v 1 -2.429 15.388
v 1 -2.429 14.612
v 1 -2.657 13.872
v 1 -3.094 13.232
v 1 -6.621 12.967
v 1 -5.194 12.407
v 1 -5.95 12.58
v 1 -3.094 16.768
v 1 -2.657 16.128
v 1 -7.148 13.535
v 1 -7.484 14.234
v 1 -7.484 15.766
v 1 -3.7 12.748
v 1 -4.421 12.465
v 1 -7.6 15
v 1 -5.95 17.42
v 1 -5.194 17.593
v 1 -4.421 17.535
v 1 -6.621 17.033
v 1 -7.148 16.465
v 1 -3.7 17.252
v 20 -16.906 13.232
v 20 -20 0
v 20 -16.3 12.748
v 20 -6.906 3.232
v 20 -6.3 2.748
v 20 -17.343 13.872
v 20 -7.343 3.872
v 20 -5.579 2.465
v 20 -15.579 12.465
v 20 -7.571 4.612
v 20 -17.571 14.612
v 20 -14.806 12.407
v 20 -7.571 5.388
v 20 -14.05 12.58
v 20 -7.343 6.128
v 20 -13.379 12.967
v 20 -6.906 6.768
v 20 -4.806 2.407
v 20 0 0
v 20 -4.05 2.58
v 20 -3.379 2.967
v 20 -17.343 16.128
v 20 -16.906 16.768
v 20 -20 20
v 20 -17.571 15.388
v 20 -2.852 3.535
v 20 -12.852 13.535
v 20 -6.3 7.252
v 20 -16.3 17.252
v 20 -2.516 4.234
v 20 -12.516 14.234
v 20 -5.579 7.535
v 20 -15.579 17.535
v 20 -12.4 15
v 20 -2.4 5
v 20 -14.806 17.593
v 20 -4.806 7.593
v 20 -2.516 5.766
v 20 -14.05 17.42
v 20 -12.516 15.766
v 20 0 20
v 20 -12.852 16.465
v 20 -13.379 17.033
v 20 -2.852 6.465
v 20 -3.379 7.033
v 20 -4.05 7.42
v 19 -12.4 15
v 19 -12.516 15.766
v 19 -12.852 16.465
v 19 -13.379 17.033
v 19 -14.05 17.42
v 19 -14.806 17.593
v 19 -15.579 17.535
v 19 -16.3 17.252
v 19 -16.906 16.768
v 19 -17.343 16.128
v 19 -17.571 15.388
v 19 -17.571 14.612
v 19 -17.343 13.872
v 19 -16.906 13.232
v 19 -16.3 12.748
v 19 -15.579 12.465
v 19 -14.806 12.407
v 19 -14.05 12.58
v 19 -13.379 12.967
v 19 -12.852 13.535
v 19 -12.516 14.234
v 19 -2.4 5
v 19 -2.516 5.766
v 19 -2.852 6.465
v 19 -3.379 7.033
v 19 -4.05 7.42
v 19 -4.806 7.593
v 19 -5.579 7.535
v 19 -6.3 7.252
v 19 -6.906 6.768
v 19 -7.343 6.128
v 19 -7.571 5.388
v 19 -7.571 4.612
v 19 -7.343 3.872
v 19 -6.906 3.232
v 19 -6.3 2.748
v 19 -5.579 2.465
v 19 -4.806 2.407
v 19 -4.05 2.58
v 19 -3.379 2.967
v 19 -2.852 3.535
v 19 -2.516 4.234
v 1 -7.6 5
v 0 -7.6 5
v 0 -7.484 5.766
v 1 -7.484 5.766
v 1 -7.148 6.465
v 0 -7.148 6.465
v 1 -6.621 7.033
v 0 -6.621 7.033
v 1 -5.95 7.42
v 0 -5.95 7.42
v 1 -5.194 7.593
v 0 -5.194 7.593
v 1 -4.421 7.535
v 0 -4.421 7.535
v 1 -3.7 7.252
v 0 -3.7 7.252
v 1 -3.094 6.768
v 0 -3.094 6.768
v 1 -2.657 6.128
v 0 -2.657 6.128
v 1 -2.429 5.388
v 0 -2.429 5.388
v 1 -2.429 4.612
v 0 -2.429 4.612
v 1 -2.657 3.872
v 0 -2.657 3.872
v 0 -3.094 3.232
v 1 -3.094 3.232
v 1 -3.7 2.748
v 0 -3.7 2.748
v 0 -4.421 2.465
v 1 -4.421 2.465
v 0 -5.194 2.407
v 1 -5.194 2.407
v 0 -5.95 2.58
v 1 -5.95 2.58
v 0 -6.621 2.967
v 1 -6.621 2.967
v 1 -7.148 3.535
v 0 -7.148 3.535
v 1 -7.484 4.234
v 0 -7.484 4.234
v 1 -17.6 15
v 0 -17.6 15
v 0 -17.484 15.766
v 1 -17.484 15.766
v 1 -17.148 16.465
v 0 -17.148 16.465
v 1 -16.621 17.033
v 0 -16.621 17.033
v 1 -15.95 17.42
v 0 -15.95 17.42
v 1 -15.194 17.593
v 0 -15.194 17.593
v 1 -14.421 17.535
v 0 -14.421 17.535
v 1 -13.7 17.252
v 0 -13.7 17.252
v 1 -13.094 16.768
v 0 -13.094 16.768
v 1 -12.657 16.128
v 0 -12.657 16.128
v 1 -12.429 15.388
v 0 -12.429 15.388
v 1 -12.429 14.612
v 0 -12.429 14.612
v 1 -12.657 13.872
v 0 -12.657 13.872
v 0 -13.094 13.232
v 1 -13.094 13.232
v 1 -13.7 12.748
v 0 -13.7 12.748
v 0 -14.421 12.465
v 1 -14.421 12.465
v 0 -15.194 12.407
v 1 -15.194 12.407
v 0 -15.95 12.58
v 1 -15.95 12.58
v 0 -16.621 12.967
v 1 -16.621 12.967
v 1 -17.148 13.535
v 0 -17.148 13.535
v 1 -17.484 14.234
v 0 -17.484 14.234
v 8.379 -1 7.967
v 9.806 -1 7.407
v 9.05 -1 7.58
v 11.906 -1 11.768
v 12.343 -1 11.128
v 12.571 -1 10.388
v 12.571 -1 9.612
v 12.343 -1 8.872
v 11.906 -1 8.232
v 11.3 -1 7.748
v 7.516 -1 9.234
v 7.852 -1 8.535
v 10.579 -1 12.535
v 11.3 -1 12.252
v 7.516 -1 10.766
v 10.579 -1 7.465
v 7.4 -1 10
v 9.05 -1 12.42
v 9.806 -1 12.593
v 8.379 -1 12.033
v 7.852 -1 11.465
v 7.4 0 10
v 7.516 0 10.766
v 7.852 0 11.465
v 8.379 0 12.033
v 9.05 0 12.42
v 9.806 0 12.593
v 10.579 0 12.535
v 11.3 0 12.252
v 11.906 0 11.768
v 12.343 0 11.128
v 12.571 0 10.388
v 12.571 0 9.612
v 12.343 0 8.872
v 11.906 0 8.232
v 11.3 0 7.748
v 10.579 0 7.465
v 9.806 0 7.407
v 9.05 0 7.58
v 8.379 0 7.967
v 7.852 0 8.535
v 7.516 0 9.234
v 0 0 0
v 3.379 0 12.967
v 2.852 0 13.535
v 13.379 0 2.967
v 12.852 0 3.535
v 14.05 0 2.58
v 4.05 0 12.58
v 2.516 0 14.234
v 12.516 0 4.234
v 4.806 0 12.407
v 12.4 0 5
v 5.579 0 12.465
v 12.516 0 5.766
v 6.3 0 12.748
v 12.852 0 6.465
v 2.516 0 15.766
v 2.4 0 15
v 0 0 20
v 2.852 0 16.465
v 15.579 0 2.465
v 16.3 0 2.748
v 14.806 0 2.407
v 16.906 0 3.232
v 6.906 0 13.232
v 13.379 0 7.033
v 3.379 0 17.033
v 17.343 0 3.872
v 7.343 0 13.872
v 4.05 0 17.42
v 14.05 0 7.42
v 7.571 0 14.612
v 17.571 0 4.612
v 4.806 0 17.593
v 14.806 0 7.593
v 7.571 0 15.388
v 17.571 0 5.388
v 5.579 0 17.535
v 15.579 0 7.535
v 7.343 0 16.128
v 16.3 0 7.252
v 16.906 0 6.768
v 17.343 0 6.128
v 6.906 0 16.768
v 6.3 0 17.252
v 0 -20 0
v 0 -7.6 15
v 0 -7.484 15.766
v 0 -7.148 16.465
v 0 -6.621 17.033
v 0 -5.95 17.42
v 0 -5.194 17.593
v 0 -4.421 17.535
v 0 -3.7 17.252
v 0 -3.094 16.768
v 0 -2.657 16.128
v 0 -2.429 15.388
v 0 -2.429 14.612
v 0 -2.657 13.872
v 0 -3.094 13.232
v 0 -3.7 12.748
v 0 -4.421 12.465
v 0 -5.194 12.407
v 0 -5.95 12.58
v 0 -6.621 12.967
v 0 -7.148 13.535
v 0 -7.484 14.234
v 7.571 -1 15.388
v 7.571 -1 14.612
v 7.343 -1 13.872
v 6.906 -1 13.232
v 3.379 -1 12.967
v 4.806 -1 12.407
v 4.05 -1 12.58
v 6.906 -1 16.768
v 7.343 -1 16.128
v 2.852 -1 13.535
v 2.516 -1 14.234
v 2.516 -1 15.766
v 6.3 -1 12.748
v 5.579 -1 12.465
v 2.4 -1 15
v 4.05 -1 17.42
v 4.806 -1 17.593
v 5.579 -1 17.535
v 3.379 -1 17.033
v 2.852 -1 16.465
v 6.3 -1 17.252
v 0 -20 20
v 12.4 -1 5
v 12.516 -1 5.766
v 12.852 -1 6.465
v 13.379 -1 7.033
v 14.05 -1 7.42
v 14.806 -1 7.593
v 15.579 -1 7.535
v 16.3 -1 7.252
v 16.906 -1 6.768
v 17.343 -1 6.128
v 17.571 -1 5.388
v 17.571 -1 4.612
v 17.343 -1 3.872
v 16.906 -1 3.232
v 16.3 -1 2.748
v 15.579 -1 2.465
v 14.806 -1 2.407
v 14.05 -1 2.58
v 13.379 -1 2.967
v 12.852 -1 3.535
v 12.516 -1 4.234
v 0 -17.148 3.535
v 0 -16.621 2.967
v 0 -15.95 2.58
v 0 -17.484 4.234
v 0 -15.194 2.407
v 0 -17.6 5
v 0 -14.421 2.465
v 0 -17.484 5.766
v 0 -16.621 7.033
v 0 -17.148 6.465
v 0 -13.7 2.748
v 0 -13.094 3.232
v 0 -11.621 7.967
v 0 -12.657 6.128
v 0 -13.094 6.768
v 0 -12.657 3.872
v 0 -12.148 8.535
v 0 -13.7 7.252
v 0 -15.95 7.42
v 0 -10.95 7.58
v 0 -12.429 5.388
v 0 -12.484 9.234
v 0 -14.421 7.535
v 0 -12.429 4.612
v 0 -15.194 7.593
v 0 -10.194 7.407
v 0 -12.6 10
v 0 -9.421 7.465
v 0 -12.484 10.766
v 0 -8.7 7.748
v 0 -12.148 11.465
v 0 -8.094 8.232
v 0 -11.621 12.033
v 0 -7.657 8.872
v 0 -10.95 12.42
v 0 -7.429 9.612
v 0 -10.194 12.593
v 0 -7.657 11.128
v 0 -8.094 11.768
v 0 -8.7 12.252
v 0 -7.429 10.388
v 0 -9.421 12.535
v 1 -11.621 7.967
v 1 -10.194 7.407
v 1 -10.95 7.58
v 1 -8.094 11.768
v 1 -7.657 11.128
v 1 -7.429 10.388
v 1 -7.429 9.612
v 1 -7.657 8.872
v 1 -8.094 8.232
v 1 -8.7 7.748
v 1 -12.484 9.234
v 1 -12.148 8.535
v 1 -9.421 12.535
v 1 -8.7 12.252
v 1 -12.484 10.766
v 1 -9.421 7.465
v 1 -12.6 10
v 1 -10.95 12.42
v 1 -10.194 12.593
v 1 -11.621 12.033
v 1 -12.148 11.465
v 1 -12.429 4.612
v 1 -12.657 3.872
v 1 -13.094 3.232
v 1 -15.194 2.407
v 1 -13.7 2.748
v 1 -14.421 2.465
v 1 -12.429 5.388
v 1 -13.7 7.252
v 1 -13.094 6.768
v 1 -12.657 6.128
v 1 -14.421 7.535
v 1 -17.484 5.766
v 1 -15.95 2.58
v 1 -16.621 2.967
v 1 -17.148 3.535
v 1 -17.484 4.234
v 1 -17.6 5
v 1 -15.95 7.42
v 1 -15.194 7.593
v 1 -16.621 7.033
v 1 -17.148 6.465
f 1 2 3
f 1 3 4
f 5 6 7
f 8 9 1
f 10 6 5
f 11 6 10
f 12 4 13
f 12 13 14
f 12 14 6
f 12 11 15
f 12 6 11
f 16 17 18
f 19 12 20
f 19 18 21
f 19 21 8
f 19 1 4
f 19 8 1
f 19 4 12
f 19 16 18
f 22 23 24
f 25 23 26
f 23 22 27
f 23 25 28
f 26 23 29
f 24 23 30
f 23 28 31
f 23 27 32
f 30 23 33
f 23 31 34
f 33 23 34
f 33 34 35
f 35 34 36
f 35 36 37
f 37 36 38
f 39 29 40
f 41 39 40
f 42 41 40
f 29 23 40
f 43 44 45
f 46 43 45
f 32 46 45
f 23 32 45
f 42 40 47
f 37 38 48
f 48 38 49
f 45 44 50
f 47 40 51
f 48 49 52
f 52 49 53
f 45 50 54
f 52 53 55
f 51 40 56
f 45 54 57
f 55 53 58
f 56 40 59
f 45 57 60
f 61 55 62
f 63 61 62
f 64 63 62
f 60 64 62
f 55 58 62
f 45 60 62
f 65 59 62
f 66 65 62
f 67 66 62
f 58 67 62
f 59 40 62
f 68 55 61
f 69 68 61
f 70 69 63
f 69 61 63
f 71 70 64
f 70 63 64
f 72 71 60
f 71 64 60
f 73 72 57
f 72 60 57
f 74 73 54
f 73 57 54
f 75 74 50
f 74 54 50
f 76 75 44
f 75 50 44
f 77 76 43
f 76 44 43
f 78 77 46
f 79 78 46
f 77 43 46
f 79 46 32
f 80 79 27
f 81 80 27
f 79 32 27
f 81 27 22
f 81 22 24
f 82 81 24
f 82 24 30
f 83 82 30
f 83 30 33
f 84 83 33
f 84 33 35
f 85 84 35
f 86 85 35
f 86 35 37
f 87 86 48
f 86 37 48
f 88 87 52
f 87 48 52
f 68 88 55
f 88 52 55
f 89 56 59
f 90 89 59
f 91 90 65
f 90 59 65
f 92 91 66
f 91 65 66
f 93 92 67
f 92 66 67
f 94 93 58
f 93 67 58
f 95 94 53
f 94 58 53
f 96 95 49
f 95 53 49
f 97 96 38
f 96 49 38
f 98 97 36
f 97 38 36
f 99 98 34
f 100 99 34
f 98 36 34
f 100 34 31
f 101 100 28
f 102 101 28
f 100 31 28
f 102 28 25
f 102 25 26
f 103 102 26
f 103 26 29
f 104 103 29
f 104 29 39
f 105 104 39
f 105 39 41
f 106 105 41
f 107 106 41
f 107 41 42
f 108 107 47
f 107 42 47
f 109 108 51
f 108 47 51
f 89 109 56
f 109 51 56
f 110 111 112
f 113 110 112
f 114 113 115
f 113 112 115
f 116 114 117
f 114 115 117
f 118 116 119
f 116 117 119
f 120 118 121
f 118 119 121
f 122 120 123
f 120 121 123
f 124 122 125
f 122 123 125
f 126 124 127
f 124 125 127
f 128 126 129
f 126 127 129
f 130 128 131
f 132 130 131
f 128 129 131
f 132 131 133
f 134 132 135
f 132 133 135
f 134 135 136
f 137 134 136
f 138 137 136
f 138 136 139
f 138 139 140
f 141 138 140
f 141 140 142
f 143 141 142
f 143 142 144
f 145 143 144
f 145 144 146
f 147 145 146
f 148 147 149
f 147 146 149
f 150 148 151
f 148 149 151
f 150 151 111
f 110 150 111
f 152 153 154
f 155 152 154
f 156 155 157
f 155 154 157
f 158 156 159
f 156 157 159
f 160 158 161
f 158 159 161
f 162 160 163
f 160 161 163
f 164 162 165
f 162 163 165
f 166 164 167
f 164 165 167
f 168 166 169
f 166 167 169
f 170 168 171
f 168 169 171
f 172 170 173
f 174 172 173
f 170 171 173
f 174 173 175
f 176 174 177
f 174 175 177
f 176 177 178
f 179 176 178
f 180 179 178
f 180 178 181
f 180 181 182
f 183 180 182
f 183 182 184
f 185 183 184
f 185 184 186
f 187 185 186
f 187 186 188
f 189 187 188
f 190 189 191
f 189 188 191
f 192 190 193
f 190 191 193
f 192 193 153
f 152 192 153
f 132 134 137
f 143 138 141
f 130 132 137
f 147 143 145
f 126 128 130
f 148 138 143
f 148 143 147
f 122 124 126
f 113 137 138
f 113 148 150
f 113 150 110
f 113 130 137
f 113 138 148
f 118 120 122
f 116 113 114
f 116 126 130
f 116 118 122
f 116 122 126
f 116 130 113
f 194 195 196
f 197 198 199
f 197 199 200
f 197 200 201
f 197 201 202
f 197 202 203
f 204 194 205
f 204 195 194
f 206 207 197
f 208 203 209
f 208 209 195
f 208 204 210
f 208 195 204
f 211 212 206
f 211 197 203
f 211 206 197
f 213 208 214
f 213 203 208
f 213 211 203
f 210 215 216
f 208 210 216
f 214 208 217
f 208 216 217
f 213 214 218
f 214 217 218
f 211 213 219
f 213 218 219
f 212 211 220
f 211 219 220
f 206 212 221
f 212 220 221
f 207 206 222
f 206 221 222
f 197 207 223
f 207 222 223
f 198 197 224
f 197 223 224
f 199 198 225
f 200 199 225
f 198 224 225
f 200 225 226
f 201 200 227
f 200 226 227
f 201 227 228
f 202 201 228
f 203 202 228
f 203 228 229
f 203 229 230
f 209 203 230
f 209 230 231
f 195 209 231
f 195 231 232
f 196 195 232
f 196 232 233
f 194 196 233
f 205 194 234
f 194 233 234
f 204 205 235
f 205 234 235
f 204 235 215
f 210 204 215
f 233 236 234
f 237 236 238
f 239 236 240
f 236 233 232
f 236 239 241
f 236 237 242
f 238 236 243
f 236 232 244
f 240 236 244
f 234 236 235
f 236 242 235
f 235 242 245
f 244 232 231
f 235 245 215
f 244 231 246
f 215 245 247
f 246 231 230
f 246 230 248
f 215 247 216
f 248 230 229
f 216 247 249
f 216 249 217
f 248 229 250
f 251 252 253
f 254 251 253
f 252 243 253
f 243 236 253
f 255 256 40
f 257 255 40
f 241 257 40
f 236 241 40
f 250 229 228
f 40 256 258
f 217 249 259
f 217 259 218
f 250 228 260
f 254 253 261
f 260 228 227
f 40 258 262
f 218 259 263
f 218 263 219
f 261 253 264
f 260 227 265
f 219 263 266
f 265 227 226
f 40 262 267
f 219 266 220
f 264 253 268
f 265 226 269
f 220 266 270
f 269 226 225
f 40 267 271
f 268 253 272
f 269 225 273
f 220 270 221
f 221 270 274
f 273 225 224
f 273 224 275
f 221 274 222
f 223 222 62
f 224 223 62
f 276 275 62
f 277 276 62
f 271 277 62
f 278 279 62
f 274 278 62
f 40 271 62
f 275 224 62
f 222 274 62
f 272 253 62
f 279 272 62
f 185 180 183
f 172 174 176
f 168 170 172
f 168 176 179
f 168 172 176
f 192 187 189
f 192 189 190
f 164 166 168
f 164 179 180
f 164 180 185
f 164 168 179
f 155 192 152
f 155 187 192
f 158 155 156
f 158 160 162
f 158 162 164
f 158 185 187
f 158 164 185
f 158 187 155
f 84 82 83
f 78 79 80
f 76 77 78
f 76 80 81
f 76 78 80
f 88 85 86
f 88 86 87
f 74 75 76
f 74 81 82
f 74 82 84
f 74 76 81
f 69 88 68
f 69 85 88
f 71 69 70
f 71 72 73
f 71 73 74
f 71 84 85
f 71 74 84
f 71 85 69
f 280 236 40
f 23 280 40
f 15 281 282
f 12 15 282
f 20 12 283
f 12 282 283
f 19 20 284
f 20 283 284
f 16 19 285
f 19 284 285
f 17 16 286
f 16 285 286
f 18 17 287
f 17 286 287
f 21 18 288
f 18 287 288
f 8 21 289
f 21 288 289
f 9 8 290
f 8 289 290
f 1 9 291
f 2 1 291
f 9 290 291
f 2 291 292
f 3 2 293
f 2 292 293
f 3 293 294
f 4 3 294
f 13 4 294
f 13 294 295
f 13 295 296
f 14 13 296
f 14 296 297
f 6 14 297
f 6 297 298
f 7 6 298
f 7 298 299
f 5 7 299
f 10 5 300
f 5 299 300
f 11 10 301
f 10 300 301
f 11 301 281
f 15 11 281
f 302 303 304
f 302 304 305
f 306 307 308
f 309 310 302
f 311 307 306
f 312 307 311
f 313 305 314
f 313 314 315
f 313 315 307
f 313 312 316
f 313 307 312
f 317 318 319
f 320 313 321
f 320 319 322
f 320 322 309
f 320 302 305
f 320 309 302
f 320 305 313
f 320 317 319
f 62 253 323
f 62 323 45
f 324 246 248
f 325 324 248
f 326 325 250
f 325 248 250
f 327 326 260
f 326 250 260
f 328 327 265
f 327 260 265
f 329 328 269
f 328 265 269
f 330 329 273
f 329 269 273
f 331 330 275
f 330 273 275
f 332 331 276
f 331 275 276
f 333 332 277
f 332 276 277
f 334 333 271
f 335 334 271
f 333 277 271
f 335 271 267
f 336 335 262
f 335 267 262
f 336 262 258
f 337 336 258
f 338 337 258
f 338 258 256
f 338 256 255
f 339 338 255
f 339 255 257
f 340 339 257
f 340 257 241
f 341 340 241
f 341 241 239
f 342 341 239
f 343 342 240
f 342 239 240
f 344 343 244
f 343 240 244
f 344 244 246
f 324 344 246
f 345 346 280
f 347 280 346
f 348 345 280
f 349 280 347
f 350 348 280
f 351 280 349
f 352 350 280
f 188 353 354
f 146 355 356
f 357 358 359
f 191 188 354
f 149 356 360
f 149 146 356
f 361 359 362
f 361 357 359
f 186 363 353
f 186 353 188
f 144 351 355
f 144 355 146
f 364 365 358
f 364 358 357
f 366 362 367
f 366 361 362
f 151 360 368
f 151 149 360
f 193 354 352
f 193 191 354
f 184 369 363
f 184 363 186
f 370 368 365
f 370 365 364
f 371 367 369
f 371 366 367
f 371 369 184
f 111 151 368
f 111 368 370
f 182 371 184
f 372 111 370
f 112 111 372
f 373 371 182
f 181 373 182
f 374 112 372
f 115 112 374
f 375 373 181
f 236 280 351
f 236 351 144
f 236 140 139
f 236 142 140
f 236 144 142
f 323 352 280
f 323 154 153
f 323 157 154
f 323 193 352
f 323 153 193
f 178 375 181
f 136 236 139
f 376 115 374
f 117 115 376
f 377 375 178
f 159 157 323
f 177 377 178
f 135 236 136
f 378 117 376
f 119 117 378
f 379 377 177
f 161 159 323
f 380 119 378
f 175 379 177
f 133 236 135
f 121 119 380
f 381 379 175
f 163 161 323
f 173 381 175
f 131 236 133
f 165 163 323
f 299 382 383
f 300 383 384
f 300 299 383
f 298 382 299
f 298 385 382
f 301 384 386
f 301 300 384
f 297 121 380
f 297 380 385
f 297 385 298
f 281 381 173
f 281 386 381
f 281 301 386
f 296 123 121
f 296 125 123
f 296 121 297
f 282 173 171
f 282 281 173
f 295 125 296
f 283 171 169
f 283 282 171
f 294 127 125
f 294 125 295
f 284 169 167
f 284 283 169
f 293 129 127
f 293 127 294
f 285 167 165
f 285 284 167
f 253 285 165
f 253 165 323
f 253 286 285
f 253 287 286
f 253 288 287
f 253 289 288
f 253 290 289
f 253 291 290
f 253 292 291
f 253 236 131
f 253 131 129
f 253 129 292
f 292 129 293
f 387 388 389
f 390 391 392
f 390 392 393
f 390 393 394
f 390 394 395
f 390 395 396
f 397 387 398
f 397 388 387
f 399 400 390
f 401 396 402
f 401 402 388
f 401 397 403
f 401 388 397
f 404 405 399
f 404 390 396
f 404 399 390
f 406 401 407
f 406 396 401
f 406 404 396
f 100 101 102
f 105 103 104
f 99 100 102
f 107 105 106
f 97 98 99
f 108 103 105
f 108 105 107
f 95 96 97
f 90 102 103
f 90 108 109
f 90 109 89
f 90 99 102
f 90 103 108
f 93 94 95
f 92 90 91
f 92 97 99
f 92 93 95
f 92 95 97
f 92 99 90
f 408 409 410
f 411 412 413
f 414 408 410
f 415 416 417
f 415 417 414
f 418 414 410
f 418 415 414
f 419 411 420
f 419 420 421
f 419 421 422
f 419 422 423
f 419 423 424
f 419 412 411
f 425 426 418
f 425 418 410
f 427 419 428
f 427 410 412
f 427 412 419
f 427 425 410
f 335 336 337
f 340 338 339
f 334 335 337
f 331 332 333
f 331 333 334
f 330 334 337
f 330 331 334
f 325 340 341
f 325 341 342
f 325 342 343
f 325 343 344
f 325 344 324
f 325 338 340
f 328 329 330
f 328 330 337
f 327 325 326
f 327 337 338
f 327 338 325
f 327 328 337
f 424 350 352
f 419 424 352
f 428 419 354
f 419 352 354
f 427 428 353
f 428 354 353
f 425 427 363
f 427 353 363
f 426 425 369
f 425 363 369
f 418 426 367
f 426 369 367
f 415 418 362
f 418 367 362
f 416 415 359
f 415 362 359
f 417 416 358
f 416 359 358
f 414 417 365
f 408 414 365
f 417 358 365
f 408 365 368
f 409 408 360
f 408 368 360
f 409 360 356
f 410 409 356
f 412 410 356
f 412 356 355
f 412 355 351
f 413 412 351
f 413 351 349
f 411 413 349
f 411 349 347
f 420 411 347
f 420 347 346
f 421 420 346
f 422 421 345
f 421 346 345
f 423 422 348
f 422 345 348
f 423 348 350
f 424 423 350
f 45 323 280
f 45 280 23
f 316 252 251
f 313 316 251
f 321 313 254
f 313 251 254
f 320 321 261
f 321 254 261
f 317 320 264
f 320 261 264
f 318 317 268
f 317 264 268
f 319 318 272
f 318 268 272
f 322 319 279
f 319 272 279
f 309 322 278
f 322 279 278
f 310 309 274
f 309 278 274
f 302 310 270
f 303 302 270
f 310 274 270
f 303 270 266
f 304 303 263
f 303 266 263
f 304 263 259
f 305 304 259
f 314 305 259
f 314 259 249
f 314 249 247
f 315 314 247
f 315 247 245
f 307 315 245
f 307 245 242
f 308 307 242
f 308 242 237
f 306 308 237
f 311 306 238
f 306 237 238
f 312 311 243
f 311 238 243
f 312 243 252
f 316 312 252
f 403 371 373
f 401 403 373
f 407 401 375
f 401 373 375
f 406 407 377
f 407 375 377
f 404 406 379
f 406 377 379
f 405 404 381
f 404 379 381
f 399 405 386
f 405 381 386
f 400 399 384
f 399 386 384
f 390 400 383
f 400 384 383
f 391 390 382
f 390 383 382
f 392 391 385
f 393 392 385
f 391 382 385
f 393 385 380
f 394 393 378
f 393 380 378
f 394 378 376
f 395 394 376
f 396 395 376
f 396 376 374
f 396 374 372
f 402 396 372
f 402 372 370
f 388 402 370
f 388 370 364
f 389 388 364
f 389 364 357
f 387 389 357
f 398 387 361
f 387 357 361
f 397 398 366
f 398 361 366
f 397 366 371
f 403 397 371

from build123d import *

# Parameters (mm, degrees)
F0_W     = 20
F0_H     = 20
F1_DEPTH = 20
F2_R     = 2.6
F3_DEPTH = 1
F4_R     = 2.6
F5_DEPTH = 1
F6_R     = 2.6
F7_DEPTH = 1


with BuildPart() as f1:
    # F0 (on Front) → F1 (new body)
    with BuildSketch(Plane.XZ):
        with Locations((10, 10)):
            Rectangle(F0_W, F0_H)
    extrude(amount=F1_DEPTH)

    # F2 (on face) → F3 (cut)
    with BuildSketch(Plane(origin=(0, 0, 0), x_dir=(0, -1, 0), z_dir=(-1, 0, 0))):
        with Locations((10, 10)):
            Circle(F2_R)
        with Locations((5, 15)):
            Circle(F2_R)
        with Locations((15, 15)):
            Circle(F2_R)
        with Locations((15, 5)):
            Circle(F2_R)
        with Locations((5, 5)):
            Circle(F2_R)
    extrude(amount=-F3_DEPTH, mode=Mode.SUBTRACT)

    # F4 (on face) → F5 (cut)
    with BuildSketch(Plane.YZ.offset(20)):
        with Locations((-15, 15)):
            Circle(F4_R)
        with Locations((-5, 5)):
            Circle(F4_R)
    extrude(amount=-F5_DEPTH, mode=Mode.SUBTRACT)

    # F6 (on face) → F7 (cut)
    with BuildSketch(Plane(origin=(0, 0, 0), x_dir=(-1, 0, 0), z_dir=(0, 1, 0))):
        with Locations((-10, 10)):
            Circle(F6_R)
        with Locations((-5, 15)):
            Circle(F6_R)
        with Locations((-15, 5)):
            Circle(F6_R)
    extrude(amount=-F7_DEPTH, mode=Mode.SUBTRACT)


solid = f1.part
